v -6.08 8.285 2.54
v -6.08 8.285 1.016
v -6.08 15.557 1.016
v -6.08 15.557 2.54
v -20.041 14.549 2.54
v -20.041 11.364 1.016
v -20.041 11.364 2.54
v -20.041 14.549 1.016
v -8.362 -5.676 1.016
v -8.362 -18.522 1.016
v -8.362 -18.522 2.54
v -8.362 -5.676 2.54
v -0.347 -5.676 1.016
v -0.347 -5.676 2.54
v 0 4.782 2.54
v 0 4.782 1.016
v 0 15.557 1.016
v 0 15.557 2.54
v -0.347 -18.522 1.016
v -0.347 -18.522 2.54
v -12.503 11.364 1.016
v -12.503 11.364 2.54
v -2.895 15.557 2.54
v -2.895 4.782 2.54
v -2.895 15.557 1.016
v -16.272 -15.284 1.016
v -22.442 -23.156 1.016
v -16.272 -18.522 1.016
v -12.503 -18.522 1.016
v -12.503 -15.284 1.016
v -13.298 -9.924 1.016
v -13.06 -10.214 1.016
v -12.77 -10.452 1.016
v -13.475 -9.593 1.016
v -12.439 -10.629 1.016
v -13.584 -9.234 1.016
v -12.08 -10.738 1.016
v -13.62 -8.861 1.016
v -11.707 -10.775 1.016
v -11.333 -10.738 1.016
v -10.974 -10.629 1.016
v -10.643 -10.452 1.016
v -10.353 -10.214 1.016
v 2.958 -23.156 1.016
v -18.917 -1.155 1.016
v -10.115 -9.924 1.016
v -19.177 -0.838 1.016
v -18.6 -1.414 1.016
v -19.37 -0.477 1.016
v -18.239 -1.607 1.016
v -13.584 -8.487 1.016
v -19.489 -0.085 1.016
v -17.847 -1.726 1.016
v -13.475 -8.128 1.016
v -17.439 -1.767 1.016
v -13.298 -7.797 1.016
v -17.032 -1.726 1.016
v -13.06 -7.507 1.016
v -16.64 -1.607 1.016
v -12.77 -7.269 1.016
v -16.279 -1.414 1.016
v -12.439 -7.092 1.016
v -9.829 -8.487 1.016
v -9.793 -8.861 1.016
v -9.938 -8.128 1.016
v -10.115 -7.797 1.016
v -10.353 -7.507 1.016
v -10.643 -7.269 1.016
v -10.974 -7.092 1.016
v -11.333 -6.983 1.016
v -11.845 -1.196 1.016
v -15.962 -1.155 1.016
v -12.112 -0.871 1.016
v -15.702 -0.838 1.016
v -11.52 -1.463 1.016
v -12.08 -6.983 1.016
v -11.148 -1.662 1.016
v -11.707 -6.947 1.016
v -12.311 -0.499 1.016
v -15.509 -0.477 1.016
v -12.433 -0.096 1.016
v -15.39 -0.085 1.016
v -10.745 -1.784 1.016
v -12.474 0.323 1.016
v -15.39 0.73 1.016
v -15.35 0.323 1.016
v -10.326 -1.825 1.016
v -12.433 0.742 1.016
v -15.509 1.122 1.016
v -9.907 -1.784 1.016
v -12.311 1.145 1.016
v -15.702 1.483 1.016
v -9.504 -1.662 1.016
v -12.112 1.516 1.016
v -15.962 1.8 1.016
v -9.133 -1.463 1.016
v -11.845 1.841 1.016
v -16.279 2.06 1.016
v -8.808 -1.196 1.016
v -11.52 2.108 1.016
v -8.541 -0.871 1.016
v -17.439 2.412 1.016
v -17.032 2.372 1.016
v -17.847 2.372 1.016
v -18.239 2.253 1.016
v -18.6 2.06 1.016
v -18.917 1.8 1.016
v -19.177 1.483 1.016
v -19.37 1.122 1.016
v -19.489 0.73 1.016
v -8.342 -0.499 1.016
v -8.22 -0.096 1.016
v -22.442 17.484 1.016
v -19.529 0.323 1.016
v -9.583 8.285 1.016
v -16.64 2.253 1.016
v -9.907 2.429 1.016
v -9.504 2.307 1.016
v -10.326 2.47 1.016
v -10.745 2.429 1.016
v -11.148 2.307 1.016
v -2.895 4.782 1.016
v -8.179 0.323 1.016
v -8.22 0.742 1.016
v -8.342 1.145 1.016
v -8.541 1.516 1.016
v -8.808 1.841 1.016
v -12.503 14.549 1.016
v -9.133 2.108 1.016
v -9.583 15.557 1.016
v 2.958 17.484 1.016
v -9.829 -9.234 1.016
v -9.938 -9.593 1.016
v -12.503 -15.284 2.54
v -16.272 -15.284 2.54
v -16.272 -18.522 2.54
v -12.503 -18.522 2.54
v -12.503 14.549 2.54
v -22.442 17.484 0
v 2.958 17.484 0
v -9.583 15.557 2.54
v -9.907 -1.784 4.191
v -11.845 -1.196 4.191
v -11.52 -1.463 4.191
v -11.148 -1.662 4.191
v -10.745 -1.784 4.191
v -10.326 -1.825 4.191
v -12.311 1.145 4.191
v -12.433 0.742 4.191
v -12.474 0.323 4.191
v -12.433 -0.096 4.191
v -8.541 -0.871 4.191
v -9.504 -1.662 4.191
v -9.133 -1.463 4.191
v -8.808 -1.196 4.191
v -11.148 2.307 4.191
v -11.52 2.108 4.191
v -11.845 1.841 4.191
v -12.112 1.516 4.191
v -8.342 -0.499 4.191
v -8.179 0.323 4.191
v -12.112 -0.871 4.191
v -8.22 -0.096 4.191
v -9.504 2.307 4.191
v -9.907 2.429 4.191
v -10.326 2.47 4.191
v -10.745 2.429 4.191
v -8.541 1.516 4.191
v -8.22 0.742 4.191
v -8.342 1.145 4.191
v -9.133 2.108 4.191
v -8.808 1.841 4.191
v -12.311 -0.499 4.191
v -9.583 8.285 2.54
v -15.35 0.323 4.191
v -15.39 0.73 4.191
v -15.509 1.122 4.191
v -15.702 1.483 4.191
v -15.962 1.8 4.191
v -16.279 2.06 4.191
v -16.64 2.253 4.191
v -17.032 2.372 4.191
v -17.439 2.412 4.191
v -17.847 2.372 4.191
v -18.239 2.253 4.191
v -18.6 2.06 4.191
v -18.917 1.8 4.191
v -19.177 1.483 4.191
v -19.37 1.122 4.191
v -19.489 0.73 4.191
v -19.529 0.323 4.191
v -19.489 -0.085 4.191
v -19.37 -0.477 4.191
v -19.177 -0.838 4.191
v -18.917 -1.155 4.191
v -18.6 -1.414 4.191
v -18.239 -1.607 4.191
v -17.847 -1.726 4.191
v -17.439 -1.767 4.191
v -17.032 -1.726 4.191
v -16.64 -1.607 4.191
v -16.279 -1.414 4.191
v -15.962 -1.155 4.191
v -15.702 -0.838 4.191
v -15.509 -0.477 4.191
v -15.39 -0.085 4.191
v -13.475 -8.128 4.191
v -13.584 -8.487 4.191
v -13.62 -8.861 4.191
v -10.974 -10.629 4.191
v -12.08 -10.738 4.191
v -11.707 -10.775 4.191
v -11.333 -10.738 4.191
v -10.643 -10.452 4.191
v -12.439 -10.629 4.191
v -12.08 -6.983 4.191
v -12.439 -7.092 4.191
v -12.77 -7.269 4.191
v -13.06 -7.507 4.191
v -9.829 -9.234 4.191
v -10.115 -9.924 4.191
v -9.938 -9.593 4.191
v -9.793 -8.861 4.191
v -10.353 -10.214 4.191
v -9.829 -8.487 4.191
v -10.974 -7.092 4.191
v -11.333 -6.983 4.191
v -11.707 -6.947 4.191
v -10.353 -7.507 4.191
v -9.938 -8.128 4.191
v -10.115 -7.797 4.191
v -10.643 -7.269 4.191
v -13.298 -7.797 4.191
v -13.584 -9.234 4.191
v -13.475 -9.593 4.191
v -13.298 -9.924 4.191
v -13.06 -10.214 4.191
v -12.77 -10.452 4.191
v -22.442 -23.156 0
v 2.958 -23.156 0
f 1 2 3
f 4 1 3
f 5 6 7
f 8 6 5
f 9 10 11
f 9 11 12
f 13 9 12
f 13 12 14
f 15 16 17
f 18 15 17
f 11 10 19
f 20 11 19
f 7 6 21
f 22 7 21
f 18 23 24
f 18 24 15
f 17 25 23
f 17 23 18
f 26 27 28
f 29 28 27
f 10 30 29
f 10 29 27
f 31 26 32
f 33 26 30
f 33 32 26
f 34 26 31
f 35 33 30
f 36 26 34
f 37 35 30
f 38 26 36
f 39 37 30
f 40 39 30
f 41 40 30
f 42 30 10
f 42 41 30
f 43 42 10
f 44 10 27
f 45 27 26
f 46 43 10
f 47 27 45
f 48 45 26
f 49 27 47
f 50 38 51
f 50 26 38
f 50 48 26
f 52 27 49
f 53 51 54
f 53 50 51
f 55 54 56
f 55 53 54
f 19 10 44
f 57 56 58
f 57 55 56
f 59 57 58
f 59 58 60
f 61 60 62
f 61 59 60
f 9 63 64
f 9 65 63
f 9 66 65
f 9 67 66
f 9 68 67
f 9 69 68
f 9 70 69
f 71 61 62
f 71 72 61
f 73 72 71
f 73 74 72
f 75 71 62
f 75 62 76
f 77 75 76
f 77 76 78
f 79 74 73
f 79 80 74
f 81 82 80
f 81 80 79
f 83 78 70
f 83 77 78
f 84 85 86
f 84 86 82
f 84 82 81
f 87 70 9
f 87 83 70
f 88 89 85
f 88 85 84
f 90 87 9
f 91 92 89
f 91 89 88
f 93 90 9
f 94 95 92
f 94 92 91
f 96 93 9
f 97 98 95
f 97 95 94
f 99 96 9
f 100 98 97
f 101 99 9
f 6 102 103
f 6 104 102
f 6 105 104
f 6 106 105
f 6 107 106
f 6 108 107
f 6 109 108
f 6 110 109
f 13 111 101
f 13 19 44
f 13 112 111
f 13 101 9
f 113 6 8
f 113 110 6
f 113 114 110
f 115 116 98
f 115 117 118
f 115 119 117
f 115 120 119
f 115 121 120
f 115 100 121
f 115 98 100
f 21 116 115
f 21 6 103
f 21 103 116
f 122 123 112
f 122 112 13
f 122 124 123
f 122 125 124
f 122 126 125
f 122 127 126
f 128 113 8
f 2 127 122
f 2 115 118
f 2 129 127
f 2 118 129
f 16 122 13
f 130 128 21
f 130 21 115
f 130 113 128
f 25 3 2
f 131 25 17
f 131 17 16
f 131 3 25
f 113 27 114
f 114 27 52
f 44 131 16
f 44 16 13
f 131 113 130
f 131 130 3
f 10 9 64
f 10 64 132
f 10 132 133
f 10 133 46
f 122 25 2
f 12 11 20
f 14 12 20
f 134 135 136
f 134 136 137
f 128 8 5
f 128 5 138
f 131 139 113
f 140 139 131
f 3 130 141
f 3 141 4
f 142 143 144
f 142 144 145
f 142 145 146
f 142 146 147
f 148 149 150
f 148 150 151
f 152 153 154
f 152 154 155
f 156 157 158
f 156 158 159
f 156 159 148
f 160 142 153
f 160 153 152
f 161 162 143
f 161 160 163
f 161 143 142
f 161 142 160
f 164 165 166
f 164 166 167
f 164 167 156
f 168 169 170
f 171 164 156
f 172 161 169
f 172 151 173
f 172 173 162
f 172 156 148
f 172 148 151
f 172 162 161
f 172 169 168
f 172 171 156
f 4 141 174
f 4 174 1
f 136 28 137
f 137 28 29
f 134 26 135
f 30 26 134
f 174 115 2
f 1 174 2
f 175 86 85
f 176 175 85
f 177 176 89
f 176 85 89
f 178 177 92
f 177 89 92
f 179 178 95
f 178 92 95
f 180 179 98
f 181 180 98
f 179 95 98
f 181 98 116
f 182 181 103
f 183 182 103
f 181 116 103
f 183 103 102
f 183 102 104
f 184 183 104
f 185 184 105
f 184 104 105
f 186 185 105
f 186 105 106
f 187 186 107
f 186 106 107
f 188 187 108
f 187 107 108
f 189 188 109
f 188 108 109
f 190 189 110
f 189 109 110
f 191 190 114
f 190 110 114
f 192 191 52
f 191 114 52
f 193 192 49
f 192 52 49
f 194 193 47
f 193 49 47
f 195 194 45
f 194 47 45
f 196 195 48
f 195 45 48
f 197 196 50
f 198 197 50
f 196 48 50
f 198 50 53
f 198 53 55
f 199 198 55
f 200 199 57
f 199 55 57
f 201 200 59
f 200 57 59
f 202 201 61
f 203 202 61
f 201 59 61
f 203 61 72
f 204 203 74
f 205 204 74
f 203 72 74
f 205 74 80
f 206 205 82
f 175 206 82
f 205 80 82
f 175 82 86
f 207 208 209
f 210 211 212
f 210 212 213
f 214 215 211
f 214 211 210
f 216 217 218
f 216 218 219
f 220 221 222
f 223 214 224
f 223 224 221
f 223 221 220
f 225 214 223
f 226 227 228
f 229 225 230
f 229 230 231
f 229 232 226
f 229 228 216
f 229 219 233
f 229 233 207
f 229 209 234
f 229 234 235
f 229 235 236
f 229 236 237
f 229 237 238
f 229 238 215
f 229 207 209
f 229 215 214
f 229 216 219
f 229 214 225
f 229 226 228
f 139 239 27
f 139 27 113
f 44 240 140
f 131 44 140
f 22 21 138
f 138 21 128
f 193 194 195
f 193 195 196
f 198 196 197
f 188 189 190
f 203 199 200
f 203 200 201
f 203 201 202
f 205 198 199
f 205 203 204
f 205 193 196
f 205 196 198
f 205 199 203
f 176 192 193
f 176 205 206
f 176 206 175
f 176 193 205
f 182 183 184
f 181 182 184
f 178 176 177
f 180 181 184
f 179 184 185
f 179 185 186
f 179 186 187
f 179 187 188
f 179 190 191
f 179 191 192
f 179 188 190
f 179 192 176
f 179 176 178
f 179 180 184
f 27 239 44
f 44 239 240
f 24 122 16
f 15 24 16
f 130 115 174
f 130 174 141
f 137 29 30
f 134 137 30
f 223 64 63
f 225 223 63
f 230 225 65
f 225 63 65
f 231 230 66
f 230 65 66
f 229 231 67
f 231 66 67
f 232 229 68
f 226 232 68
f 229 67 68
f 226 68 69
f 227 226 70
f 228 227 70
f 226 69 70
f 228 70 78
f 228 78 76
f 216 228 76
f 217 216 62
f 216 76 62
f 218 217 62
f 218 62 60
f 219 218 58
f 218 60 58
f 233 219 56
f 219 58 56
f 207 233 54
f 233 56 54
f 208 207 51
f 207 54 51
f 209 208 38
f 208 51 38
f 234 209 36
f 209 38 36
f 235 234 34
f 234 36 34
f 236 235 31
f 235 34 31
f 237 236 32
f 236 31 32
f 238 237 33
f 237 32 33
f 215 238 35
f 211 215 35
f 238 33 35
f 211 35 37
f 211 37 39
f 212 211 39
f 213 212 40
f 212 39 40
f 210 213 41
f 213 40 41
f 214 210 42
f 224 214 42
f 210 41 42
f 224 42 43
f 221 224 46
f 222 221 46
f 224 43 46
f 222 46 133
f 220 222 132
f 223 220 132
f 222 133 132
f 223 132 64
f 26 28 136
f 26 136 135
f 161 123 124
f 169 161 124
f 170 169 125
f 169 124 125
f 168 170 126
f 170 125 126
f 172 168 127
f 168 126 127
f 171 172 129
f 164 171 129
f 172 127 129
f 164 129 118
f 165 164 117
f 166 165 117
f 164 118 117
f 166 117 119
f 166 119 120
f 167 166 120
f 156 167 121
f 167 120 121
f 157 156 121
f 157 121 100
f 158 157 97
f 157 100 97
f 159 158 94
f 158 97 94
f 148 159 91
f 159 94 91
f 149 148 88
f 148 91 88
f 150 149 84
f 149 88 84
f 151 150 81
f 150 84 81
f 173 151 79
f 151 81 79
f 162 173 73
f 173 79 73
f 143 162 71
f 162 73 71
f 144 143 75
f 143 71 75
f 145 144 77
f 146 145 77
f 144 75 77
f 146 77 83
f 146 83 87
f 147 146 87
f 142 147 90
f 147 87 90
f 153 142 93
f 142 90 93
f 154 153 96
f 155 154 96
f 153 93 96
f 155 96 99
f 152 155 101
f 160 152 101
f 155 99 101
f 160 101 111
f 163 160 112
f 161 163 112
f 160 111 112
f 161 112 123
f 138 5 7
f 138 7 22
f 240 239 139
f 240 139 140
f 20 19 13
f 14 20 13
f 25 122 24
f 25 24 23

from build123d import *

# Parameters (mm, degrees)
SKETCH1_W           = 25.4
SKETCH1_H           = 40.64
BOSS_EXTRUDE1_DEPTH = 1.016
SKETCH4_R           = 2.089194207
SKETCH4_R_2         = 2.147685622
SKETCH4_R_3         = 1.913924405
BOSS_EXTRUDE3_DEPTH = 3.175
SKETCH3_W           = 2.894795888
SKETCH3_H           = 10.775790564
SKETCH3_W_2         = 3.503459001
SKETCH3_H_2         = 7.272331563
SKETCH3_W_3         = 7.537745123
SKETCH3_H_3         = 3.184962728
SKETCH3_W_4         = 3.768872561
SKETCH3_H_4         = 3.23804544
SKETCH3_W_5         = 8.015489533
SKETCH3_H_5         = 12.846016337
BOSS_EXTRUDE2_DEPTH = 2.54


with BuildPart() as part:
    # Sketch1 → Boss-Extrude1 (new body)
    with BuildSketch(Plane.XY):
        with Locations((-9.742465753, -2.835753425)):
            Rectangle(SKETCH1_W, SKETCH1_H)
    extrude(amount=BOSS_EXTRUDE1_DEPTH)

    # Sketch4 → Boss-Extrude3 (add)
    with BuildSketch(Plane.XY.offset(1.016)):
        with Locations((-17.439459013, 0.322667948)):
            Circle(SKETCH4_R)
        with Locations((-10.326375587, 0.322667948)):
            Circle(SKETCH4_R_2)
        with Locations((-11.706526103, -8.860641252)):
            Circle(SKETCH4_R_3)
    extrude(amount=BOSS_EXTRUDE3_DEPTH)

    # Sketch3 → Boss-Extrude2 (add)
    with BuildSketch(Plane.XY):
        with Locations((-1.447397944, 10.169511049)):
            Rectangle(SKETCH3_W, SKETCH3_H)
        with Locations((-7.831488117, 11.92124055)):
            Rectangle(SKETCH3_W_2, SKETCH3_H_2)
        with Locations((-16.271639347, 12.956353436)):
            Rectangle(SKETCH3_W_3, SKETCH3_H_3)
        with Locations((-14.387203065, -16.902672141)):
            Rectangle(SKETCH3_W_4, SKETCH3_H_4)
        with Locations((-4.354570472, -12.098686692)):
            Rectangle(SKETCH3_W_5, SKETCH3_H_5)
    extrude(amount=BOSS_EXTRUDE2_DEPTH)


solid = part.part
